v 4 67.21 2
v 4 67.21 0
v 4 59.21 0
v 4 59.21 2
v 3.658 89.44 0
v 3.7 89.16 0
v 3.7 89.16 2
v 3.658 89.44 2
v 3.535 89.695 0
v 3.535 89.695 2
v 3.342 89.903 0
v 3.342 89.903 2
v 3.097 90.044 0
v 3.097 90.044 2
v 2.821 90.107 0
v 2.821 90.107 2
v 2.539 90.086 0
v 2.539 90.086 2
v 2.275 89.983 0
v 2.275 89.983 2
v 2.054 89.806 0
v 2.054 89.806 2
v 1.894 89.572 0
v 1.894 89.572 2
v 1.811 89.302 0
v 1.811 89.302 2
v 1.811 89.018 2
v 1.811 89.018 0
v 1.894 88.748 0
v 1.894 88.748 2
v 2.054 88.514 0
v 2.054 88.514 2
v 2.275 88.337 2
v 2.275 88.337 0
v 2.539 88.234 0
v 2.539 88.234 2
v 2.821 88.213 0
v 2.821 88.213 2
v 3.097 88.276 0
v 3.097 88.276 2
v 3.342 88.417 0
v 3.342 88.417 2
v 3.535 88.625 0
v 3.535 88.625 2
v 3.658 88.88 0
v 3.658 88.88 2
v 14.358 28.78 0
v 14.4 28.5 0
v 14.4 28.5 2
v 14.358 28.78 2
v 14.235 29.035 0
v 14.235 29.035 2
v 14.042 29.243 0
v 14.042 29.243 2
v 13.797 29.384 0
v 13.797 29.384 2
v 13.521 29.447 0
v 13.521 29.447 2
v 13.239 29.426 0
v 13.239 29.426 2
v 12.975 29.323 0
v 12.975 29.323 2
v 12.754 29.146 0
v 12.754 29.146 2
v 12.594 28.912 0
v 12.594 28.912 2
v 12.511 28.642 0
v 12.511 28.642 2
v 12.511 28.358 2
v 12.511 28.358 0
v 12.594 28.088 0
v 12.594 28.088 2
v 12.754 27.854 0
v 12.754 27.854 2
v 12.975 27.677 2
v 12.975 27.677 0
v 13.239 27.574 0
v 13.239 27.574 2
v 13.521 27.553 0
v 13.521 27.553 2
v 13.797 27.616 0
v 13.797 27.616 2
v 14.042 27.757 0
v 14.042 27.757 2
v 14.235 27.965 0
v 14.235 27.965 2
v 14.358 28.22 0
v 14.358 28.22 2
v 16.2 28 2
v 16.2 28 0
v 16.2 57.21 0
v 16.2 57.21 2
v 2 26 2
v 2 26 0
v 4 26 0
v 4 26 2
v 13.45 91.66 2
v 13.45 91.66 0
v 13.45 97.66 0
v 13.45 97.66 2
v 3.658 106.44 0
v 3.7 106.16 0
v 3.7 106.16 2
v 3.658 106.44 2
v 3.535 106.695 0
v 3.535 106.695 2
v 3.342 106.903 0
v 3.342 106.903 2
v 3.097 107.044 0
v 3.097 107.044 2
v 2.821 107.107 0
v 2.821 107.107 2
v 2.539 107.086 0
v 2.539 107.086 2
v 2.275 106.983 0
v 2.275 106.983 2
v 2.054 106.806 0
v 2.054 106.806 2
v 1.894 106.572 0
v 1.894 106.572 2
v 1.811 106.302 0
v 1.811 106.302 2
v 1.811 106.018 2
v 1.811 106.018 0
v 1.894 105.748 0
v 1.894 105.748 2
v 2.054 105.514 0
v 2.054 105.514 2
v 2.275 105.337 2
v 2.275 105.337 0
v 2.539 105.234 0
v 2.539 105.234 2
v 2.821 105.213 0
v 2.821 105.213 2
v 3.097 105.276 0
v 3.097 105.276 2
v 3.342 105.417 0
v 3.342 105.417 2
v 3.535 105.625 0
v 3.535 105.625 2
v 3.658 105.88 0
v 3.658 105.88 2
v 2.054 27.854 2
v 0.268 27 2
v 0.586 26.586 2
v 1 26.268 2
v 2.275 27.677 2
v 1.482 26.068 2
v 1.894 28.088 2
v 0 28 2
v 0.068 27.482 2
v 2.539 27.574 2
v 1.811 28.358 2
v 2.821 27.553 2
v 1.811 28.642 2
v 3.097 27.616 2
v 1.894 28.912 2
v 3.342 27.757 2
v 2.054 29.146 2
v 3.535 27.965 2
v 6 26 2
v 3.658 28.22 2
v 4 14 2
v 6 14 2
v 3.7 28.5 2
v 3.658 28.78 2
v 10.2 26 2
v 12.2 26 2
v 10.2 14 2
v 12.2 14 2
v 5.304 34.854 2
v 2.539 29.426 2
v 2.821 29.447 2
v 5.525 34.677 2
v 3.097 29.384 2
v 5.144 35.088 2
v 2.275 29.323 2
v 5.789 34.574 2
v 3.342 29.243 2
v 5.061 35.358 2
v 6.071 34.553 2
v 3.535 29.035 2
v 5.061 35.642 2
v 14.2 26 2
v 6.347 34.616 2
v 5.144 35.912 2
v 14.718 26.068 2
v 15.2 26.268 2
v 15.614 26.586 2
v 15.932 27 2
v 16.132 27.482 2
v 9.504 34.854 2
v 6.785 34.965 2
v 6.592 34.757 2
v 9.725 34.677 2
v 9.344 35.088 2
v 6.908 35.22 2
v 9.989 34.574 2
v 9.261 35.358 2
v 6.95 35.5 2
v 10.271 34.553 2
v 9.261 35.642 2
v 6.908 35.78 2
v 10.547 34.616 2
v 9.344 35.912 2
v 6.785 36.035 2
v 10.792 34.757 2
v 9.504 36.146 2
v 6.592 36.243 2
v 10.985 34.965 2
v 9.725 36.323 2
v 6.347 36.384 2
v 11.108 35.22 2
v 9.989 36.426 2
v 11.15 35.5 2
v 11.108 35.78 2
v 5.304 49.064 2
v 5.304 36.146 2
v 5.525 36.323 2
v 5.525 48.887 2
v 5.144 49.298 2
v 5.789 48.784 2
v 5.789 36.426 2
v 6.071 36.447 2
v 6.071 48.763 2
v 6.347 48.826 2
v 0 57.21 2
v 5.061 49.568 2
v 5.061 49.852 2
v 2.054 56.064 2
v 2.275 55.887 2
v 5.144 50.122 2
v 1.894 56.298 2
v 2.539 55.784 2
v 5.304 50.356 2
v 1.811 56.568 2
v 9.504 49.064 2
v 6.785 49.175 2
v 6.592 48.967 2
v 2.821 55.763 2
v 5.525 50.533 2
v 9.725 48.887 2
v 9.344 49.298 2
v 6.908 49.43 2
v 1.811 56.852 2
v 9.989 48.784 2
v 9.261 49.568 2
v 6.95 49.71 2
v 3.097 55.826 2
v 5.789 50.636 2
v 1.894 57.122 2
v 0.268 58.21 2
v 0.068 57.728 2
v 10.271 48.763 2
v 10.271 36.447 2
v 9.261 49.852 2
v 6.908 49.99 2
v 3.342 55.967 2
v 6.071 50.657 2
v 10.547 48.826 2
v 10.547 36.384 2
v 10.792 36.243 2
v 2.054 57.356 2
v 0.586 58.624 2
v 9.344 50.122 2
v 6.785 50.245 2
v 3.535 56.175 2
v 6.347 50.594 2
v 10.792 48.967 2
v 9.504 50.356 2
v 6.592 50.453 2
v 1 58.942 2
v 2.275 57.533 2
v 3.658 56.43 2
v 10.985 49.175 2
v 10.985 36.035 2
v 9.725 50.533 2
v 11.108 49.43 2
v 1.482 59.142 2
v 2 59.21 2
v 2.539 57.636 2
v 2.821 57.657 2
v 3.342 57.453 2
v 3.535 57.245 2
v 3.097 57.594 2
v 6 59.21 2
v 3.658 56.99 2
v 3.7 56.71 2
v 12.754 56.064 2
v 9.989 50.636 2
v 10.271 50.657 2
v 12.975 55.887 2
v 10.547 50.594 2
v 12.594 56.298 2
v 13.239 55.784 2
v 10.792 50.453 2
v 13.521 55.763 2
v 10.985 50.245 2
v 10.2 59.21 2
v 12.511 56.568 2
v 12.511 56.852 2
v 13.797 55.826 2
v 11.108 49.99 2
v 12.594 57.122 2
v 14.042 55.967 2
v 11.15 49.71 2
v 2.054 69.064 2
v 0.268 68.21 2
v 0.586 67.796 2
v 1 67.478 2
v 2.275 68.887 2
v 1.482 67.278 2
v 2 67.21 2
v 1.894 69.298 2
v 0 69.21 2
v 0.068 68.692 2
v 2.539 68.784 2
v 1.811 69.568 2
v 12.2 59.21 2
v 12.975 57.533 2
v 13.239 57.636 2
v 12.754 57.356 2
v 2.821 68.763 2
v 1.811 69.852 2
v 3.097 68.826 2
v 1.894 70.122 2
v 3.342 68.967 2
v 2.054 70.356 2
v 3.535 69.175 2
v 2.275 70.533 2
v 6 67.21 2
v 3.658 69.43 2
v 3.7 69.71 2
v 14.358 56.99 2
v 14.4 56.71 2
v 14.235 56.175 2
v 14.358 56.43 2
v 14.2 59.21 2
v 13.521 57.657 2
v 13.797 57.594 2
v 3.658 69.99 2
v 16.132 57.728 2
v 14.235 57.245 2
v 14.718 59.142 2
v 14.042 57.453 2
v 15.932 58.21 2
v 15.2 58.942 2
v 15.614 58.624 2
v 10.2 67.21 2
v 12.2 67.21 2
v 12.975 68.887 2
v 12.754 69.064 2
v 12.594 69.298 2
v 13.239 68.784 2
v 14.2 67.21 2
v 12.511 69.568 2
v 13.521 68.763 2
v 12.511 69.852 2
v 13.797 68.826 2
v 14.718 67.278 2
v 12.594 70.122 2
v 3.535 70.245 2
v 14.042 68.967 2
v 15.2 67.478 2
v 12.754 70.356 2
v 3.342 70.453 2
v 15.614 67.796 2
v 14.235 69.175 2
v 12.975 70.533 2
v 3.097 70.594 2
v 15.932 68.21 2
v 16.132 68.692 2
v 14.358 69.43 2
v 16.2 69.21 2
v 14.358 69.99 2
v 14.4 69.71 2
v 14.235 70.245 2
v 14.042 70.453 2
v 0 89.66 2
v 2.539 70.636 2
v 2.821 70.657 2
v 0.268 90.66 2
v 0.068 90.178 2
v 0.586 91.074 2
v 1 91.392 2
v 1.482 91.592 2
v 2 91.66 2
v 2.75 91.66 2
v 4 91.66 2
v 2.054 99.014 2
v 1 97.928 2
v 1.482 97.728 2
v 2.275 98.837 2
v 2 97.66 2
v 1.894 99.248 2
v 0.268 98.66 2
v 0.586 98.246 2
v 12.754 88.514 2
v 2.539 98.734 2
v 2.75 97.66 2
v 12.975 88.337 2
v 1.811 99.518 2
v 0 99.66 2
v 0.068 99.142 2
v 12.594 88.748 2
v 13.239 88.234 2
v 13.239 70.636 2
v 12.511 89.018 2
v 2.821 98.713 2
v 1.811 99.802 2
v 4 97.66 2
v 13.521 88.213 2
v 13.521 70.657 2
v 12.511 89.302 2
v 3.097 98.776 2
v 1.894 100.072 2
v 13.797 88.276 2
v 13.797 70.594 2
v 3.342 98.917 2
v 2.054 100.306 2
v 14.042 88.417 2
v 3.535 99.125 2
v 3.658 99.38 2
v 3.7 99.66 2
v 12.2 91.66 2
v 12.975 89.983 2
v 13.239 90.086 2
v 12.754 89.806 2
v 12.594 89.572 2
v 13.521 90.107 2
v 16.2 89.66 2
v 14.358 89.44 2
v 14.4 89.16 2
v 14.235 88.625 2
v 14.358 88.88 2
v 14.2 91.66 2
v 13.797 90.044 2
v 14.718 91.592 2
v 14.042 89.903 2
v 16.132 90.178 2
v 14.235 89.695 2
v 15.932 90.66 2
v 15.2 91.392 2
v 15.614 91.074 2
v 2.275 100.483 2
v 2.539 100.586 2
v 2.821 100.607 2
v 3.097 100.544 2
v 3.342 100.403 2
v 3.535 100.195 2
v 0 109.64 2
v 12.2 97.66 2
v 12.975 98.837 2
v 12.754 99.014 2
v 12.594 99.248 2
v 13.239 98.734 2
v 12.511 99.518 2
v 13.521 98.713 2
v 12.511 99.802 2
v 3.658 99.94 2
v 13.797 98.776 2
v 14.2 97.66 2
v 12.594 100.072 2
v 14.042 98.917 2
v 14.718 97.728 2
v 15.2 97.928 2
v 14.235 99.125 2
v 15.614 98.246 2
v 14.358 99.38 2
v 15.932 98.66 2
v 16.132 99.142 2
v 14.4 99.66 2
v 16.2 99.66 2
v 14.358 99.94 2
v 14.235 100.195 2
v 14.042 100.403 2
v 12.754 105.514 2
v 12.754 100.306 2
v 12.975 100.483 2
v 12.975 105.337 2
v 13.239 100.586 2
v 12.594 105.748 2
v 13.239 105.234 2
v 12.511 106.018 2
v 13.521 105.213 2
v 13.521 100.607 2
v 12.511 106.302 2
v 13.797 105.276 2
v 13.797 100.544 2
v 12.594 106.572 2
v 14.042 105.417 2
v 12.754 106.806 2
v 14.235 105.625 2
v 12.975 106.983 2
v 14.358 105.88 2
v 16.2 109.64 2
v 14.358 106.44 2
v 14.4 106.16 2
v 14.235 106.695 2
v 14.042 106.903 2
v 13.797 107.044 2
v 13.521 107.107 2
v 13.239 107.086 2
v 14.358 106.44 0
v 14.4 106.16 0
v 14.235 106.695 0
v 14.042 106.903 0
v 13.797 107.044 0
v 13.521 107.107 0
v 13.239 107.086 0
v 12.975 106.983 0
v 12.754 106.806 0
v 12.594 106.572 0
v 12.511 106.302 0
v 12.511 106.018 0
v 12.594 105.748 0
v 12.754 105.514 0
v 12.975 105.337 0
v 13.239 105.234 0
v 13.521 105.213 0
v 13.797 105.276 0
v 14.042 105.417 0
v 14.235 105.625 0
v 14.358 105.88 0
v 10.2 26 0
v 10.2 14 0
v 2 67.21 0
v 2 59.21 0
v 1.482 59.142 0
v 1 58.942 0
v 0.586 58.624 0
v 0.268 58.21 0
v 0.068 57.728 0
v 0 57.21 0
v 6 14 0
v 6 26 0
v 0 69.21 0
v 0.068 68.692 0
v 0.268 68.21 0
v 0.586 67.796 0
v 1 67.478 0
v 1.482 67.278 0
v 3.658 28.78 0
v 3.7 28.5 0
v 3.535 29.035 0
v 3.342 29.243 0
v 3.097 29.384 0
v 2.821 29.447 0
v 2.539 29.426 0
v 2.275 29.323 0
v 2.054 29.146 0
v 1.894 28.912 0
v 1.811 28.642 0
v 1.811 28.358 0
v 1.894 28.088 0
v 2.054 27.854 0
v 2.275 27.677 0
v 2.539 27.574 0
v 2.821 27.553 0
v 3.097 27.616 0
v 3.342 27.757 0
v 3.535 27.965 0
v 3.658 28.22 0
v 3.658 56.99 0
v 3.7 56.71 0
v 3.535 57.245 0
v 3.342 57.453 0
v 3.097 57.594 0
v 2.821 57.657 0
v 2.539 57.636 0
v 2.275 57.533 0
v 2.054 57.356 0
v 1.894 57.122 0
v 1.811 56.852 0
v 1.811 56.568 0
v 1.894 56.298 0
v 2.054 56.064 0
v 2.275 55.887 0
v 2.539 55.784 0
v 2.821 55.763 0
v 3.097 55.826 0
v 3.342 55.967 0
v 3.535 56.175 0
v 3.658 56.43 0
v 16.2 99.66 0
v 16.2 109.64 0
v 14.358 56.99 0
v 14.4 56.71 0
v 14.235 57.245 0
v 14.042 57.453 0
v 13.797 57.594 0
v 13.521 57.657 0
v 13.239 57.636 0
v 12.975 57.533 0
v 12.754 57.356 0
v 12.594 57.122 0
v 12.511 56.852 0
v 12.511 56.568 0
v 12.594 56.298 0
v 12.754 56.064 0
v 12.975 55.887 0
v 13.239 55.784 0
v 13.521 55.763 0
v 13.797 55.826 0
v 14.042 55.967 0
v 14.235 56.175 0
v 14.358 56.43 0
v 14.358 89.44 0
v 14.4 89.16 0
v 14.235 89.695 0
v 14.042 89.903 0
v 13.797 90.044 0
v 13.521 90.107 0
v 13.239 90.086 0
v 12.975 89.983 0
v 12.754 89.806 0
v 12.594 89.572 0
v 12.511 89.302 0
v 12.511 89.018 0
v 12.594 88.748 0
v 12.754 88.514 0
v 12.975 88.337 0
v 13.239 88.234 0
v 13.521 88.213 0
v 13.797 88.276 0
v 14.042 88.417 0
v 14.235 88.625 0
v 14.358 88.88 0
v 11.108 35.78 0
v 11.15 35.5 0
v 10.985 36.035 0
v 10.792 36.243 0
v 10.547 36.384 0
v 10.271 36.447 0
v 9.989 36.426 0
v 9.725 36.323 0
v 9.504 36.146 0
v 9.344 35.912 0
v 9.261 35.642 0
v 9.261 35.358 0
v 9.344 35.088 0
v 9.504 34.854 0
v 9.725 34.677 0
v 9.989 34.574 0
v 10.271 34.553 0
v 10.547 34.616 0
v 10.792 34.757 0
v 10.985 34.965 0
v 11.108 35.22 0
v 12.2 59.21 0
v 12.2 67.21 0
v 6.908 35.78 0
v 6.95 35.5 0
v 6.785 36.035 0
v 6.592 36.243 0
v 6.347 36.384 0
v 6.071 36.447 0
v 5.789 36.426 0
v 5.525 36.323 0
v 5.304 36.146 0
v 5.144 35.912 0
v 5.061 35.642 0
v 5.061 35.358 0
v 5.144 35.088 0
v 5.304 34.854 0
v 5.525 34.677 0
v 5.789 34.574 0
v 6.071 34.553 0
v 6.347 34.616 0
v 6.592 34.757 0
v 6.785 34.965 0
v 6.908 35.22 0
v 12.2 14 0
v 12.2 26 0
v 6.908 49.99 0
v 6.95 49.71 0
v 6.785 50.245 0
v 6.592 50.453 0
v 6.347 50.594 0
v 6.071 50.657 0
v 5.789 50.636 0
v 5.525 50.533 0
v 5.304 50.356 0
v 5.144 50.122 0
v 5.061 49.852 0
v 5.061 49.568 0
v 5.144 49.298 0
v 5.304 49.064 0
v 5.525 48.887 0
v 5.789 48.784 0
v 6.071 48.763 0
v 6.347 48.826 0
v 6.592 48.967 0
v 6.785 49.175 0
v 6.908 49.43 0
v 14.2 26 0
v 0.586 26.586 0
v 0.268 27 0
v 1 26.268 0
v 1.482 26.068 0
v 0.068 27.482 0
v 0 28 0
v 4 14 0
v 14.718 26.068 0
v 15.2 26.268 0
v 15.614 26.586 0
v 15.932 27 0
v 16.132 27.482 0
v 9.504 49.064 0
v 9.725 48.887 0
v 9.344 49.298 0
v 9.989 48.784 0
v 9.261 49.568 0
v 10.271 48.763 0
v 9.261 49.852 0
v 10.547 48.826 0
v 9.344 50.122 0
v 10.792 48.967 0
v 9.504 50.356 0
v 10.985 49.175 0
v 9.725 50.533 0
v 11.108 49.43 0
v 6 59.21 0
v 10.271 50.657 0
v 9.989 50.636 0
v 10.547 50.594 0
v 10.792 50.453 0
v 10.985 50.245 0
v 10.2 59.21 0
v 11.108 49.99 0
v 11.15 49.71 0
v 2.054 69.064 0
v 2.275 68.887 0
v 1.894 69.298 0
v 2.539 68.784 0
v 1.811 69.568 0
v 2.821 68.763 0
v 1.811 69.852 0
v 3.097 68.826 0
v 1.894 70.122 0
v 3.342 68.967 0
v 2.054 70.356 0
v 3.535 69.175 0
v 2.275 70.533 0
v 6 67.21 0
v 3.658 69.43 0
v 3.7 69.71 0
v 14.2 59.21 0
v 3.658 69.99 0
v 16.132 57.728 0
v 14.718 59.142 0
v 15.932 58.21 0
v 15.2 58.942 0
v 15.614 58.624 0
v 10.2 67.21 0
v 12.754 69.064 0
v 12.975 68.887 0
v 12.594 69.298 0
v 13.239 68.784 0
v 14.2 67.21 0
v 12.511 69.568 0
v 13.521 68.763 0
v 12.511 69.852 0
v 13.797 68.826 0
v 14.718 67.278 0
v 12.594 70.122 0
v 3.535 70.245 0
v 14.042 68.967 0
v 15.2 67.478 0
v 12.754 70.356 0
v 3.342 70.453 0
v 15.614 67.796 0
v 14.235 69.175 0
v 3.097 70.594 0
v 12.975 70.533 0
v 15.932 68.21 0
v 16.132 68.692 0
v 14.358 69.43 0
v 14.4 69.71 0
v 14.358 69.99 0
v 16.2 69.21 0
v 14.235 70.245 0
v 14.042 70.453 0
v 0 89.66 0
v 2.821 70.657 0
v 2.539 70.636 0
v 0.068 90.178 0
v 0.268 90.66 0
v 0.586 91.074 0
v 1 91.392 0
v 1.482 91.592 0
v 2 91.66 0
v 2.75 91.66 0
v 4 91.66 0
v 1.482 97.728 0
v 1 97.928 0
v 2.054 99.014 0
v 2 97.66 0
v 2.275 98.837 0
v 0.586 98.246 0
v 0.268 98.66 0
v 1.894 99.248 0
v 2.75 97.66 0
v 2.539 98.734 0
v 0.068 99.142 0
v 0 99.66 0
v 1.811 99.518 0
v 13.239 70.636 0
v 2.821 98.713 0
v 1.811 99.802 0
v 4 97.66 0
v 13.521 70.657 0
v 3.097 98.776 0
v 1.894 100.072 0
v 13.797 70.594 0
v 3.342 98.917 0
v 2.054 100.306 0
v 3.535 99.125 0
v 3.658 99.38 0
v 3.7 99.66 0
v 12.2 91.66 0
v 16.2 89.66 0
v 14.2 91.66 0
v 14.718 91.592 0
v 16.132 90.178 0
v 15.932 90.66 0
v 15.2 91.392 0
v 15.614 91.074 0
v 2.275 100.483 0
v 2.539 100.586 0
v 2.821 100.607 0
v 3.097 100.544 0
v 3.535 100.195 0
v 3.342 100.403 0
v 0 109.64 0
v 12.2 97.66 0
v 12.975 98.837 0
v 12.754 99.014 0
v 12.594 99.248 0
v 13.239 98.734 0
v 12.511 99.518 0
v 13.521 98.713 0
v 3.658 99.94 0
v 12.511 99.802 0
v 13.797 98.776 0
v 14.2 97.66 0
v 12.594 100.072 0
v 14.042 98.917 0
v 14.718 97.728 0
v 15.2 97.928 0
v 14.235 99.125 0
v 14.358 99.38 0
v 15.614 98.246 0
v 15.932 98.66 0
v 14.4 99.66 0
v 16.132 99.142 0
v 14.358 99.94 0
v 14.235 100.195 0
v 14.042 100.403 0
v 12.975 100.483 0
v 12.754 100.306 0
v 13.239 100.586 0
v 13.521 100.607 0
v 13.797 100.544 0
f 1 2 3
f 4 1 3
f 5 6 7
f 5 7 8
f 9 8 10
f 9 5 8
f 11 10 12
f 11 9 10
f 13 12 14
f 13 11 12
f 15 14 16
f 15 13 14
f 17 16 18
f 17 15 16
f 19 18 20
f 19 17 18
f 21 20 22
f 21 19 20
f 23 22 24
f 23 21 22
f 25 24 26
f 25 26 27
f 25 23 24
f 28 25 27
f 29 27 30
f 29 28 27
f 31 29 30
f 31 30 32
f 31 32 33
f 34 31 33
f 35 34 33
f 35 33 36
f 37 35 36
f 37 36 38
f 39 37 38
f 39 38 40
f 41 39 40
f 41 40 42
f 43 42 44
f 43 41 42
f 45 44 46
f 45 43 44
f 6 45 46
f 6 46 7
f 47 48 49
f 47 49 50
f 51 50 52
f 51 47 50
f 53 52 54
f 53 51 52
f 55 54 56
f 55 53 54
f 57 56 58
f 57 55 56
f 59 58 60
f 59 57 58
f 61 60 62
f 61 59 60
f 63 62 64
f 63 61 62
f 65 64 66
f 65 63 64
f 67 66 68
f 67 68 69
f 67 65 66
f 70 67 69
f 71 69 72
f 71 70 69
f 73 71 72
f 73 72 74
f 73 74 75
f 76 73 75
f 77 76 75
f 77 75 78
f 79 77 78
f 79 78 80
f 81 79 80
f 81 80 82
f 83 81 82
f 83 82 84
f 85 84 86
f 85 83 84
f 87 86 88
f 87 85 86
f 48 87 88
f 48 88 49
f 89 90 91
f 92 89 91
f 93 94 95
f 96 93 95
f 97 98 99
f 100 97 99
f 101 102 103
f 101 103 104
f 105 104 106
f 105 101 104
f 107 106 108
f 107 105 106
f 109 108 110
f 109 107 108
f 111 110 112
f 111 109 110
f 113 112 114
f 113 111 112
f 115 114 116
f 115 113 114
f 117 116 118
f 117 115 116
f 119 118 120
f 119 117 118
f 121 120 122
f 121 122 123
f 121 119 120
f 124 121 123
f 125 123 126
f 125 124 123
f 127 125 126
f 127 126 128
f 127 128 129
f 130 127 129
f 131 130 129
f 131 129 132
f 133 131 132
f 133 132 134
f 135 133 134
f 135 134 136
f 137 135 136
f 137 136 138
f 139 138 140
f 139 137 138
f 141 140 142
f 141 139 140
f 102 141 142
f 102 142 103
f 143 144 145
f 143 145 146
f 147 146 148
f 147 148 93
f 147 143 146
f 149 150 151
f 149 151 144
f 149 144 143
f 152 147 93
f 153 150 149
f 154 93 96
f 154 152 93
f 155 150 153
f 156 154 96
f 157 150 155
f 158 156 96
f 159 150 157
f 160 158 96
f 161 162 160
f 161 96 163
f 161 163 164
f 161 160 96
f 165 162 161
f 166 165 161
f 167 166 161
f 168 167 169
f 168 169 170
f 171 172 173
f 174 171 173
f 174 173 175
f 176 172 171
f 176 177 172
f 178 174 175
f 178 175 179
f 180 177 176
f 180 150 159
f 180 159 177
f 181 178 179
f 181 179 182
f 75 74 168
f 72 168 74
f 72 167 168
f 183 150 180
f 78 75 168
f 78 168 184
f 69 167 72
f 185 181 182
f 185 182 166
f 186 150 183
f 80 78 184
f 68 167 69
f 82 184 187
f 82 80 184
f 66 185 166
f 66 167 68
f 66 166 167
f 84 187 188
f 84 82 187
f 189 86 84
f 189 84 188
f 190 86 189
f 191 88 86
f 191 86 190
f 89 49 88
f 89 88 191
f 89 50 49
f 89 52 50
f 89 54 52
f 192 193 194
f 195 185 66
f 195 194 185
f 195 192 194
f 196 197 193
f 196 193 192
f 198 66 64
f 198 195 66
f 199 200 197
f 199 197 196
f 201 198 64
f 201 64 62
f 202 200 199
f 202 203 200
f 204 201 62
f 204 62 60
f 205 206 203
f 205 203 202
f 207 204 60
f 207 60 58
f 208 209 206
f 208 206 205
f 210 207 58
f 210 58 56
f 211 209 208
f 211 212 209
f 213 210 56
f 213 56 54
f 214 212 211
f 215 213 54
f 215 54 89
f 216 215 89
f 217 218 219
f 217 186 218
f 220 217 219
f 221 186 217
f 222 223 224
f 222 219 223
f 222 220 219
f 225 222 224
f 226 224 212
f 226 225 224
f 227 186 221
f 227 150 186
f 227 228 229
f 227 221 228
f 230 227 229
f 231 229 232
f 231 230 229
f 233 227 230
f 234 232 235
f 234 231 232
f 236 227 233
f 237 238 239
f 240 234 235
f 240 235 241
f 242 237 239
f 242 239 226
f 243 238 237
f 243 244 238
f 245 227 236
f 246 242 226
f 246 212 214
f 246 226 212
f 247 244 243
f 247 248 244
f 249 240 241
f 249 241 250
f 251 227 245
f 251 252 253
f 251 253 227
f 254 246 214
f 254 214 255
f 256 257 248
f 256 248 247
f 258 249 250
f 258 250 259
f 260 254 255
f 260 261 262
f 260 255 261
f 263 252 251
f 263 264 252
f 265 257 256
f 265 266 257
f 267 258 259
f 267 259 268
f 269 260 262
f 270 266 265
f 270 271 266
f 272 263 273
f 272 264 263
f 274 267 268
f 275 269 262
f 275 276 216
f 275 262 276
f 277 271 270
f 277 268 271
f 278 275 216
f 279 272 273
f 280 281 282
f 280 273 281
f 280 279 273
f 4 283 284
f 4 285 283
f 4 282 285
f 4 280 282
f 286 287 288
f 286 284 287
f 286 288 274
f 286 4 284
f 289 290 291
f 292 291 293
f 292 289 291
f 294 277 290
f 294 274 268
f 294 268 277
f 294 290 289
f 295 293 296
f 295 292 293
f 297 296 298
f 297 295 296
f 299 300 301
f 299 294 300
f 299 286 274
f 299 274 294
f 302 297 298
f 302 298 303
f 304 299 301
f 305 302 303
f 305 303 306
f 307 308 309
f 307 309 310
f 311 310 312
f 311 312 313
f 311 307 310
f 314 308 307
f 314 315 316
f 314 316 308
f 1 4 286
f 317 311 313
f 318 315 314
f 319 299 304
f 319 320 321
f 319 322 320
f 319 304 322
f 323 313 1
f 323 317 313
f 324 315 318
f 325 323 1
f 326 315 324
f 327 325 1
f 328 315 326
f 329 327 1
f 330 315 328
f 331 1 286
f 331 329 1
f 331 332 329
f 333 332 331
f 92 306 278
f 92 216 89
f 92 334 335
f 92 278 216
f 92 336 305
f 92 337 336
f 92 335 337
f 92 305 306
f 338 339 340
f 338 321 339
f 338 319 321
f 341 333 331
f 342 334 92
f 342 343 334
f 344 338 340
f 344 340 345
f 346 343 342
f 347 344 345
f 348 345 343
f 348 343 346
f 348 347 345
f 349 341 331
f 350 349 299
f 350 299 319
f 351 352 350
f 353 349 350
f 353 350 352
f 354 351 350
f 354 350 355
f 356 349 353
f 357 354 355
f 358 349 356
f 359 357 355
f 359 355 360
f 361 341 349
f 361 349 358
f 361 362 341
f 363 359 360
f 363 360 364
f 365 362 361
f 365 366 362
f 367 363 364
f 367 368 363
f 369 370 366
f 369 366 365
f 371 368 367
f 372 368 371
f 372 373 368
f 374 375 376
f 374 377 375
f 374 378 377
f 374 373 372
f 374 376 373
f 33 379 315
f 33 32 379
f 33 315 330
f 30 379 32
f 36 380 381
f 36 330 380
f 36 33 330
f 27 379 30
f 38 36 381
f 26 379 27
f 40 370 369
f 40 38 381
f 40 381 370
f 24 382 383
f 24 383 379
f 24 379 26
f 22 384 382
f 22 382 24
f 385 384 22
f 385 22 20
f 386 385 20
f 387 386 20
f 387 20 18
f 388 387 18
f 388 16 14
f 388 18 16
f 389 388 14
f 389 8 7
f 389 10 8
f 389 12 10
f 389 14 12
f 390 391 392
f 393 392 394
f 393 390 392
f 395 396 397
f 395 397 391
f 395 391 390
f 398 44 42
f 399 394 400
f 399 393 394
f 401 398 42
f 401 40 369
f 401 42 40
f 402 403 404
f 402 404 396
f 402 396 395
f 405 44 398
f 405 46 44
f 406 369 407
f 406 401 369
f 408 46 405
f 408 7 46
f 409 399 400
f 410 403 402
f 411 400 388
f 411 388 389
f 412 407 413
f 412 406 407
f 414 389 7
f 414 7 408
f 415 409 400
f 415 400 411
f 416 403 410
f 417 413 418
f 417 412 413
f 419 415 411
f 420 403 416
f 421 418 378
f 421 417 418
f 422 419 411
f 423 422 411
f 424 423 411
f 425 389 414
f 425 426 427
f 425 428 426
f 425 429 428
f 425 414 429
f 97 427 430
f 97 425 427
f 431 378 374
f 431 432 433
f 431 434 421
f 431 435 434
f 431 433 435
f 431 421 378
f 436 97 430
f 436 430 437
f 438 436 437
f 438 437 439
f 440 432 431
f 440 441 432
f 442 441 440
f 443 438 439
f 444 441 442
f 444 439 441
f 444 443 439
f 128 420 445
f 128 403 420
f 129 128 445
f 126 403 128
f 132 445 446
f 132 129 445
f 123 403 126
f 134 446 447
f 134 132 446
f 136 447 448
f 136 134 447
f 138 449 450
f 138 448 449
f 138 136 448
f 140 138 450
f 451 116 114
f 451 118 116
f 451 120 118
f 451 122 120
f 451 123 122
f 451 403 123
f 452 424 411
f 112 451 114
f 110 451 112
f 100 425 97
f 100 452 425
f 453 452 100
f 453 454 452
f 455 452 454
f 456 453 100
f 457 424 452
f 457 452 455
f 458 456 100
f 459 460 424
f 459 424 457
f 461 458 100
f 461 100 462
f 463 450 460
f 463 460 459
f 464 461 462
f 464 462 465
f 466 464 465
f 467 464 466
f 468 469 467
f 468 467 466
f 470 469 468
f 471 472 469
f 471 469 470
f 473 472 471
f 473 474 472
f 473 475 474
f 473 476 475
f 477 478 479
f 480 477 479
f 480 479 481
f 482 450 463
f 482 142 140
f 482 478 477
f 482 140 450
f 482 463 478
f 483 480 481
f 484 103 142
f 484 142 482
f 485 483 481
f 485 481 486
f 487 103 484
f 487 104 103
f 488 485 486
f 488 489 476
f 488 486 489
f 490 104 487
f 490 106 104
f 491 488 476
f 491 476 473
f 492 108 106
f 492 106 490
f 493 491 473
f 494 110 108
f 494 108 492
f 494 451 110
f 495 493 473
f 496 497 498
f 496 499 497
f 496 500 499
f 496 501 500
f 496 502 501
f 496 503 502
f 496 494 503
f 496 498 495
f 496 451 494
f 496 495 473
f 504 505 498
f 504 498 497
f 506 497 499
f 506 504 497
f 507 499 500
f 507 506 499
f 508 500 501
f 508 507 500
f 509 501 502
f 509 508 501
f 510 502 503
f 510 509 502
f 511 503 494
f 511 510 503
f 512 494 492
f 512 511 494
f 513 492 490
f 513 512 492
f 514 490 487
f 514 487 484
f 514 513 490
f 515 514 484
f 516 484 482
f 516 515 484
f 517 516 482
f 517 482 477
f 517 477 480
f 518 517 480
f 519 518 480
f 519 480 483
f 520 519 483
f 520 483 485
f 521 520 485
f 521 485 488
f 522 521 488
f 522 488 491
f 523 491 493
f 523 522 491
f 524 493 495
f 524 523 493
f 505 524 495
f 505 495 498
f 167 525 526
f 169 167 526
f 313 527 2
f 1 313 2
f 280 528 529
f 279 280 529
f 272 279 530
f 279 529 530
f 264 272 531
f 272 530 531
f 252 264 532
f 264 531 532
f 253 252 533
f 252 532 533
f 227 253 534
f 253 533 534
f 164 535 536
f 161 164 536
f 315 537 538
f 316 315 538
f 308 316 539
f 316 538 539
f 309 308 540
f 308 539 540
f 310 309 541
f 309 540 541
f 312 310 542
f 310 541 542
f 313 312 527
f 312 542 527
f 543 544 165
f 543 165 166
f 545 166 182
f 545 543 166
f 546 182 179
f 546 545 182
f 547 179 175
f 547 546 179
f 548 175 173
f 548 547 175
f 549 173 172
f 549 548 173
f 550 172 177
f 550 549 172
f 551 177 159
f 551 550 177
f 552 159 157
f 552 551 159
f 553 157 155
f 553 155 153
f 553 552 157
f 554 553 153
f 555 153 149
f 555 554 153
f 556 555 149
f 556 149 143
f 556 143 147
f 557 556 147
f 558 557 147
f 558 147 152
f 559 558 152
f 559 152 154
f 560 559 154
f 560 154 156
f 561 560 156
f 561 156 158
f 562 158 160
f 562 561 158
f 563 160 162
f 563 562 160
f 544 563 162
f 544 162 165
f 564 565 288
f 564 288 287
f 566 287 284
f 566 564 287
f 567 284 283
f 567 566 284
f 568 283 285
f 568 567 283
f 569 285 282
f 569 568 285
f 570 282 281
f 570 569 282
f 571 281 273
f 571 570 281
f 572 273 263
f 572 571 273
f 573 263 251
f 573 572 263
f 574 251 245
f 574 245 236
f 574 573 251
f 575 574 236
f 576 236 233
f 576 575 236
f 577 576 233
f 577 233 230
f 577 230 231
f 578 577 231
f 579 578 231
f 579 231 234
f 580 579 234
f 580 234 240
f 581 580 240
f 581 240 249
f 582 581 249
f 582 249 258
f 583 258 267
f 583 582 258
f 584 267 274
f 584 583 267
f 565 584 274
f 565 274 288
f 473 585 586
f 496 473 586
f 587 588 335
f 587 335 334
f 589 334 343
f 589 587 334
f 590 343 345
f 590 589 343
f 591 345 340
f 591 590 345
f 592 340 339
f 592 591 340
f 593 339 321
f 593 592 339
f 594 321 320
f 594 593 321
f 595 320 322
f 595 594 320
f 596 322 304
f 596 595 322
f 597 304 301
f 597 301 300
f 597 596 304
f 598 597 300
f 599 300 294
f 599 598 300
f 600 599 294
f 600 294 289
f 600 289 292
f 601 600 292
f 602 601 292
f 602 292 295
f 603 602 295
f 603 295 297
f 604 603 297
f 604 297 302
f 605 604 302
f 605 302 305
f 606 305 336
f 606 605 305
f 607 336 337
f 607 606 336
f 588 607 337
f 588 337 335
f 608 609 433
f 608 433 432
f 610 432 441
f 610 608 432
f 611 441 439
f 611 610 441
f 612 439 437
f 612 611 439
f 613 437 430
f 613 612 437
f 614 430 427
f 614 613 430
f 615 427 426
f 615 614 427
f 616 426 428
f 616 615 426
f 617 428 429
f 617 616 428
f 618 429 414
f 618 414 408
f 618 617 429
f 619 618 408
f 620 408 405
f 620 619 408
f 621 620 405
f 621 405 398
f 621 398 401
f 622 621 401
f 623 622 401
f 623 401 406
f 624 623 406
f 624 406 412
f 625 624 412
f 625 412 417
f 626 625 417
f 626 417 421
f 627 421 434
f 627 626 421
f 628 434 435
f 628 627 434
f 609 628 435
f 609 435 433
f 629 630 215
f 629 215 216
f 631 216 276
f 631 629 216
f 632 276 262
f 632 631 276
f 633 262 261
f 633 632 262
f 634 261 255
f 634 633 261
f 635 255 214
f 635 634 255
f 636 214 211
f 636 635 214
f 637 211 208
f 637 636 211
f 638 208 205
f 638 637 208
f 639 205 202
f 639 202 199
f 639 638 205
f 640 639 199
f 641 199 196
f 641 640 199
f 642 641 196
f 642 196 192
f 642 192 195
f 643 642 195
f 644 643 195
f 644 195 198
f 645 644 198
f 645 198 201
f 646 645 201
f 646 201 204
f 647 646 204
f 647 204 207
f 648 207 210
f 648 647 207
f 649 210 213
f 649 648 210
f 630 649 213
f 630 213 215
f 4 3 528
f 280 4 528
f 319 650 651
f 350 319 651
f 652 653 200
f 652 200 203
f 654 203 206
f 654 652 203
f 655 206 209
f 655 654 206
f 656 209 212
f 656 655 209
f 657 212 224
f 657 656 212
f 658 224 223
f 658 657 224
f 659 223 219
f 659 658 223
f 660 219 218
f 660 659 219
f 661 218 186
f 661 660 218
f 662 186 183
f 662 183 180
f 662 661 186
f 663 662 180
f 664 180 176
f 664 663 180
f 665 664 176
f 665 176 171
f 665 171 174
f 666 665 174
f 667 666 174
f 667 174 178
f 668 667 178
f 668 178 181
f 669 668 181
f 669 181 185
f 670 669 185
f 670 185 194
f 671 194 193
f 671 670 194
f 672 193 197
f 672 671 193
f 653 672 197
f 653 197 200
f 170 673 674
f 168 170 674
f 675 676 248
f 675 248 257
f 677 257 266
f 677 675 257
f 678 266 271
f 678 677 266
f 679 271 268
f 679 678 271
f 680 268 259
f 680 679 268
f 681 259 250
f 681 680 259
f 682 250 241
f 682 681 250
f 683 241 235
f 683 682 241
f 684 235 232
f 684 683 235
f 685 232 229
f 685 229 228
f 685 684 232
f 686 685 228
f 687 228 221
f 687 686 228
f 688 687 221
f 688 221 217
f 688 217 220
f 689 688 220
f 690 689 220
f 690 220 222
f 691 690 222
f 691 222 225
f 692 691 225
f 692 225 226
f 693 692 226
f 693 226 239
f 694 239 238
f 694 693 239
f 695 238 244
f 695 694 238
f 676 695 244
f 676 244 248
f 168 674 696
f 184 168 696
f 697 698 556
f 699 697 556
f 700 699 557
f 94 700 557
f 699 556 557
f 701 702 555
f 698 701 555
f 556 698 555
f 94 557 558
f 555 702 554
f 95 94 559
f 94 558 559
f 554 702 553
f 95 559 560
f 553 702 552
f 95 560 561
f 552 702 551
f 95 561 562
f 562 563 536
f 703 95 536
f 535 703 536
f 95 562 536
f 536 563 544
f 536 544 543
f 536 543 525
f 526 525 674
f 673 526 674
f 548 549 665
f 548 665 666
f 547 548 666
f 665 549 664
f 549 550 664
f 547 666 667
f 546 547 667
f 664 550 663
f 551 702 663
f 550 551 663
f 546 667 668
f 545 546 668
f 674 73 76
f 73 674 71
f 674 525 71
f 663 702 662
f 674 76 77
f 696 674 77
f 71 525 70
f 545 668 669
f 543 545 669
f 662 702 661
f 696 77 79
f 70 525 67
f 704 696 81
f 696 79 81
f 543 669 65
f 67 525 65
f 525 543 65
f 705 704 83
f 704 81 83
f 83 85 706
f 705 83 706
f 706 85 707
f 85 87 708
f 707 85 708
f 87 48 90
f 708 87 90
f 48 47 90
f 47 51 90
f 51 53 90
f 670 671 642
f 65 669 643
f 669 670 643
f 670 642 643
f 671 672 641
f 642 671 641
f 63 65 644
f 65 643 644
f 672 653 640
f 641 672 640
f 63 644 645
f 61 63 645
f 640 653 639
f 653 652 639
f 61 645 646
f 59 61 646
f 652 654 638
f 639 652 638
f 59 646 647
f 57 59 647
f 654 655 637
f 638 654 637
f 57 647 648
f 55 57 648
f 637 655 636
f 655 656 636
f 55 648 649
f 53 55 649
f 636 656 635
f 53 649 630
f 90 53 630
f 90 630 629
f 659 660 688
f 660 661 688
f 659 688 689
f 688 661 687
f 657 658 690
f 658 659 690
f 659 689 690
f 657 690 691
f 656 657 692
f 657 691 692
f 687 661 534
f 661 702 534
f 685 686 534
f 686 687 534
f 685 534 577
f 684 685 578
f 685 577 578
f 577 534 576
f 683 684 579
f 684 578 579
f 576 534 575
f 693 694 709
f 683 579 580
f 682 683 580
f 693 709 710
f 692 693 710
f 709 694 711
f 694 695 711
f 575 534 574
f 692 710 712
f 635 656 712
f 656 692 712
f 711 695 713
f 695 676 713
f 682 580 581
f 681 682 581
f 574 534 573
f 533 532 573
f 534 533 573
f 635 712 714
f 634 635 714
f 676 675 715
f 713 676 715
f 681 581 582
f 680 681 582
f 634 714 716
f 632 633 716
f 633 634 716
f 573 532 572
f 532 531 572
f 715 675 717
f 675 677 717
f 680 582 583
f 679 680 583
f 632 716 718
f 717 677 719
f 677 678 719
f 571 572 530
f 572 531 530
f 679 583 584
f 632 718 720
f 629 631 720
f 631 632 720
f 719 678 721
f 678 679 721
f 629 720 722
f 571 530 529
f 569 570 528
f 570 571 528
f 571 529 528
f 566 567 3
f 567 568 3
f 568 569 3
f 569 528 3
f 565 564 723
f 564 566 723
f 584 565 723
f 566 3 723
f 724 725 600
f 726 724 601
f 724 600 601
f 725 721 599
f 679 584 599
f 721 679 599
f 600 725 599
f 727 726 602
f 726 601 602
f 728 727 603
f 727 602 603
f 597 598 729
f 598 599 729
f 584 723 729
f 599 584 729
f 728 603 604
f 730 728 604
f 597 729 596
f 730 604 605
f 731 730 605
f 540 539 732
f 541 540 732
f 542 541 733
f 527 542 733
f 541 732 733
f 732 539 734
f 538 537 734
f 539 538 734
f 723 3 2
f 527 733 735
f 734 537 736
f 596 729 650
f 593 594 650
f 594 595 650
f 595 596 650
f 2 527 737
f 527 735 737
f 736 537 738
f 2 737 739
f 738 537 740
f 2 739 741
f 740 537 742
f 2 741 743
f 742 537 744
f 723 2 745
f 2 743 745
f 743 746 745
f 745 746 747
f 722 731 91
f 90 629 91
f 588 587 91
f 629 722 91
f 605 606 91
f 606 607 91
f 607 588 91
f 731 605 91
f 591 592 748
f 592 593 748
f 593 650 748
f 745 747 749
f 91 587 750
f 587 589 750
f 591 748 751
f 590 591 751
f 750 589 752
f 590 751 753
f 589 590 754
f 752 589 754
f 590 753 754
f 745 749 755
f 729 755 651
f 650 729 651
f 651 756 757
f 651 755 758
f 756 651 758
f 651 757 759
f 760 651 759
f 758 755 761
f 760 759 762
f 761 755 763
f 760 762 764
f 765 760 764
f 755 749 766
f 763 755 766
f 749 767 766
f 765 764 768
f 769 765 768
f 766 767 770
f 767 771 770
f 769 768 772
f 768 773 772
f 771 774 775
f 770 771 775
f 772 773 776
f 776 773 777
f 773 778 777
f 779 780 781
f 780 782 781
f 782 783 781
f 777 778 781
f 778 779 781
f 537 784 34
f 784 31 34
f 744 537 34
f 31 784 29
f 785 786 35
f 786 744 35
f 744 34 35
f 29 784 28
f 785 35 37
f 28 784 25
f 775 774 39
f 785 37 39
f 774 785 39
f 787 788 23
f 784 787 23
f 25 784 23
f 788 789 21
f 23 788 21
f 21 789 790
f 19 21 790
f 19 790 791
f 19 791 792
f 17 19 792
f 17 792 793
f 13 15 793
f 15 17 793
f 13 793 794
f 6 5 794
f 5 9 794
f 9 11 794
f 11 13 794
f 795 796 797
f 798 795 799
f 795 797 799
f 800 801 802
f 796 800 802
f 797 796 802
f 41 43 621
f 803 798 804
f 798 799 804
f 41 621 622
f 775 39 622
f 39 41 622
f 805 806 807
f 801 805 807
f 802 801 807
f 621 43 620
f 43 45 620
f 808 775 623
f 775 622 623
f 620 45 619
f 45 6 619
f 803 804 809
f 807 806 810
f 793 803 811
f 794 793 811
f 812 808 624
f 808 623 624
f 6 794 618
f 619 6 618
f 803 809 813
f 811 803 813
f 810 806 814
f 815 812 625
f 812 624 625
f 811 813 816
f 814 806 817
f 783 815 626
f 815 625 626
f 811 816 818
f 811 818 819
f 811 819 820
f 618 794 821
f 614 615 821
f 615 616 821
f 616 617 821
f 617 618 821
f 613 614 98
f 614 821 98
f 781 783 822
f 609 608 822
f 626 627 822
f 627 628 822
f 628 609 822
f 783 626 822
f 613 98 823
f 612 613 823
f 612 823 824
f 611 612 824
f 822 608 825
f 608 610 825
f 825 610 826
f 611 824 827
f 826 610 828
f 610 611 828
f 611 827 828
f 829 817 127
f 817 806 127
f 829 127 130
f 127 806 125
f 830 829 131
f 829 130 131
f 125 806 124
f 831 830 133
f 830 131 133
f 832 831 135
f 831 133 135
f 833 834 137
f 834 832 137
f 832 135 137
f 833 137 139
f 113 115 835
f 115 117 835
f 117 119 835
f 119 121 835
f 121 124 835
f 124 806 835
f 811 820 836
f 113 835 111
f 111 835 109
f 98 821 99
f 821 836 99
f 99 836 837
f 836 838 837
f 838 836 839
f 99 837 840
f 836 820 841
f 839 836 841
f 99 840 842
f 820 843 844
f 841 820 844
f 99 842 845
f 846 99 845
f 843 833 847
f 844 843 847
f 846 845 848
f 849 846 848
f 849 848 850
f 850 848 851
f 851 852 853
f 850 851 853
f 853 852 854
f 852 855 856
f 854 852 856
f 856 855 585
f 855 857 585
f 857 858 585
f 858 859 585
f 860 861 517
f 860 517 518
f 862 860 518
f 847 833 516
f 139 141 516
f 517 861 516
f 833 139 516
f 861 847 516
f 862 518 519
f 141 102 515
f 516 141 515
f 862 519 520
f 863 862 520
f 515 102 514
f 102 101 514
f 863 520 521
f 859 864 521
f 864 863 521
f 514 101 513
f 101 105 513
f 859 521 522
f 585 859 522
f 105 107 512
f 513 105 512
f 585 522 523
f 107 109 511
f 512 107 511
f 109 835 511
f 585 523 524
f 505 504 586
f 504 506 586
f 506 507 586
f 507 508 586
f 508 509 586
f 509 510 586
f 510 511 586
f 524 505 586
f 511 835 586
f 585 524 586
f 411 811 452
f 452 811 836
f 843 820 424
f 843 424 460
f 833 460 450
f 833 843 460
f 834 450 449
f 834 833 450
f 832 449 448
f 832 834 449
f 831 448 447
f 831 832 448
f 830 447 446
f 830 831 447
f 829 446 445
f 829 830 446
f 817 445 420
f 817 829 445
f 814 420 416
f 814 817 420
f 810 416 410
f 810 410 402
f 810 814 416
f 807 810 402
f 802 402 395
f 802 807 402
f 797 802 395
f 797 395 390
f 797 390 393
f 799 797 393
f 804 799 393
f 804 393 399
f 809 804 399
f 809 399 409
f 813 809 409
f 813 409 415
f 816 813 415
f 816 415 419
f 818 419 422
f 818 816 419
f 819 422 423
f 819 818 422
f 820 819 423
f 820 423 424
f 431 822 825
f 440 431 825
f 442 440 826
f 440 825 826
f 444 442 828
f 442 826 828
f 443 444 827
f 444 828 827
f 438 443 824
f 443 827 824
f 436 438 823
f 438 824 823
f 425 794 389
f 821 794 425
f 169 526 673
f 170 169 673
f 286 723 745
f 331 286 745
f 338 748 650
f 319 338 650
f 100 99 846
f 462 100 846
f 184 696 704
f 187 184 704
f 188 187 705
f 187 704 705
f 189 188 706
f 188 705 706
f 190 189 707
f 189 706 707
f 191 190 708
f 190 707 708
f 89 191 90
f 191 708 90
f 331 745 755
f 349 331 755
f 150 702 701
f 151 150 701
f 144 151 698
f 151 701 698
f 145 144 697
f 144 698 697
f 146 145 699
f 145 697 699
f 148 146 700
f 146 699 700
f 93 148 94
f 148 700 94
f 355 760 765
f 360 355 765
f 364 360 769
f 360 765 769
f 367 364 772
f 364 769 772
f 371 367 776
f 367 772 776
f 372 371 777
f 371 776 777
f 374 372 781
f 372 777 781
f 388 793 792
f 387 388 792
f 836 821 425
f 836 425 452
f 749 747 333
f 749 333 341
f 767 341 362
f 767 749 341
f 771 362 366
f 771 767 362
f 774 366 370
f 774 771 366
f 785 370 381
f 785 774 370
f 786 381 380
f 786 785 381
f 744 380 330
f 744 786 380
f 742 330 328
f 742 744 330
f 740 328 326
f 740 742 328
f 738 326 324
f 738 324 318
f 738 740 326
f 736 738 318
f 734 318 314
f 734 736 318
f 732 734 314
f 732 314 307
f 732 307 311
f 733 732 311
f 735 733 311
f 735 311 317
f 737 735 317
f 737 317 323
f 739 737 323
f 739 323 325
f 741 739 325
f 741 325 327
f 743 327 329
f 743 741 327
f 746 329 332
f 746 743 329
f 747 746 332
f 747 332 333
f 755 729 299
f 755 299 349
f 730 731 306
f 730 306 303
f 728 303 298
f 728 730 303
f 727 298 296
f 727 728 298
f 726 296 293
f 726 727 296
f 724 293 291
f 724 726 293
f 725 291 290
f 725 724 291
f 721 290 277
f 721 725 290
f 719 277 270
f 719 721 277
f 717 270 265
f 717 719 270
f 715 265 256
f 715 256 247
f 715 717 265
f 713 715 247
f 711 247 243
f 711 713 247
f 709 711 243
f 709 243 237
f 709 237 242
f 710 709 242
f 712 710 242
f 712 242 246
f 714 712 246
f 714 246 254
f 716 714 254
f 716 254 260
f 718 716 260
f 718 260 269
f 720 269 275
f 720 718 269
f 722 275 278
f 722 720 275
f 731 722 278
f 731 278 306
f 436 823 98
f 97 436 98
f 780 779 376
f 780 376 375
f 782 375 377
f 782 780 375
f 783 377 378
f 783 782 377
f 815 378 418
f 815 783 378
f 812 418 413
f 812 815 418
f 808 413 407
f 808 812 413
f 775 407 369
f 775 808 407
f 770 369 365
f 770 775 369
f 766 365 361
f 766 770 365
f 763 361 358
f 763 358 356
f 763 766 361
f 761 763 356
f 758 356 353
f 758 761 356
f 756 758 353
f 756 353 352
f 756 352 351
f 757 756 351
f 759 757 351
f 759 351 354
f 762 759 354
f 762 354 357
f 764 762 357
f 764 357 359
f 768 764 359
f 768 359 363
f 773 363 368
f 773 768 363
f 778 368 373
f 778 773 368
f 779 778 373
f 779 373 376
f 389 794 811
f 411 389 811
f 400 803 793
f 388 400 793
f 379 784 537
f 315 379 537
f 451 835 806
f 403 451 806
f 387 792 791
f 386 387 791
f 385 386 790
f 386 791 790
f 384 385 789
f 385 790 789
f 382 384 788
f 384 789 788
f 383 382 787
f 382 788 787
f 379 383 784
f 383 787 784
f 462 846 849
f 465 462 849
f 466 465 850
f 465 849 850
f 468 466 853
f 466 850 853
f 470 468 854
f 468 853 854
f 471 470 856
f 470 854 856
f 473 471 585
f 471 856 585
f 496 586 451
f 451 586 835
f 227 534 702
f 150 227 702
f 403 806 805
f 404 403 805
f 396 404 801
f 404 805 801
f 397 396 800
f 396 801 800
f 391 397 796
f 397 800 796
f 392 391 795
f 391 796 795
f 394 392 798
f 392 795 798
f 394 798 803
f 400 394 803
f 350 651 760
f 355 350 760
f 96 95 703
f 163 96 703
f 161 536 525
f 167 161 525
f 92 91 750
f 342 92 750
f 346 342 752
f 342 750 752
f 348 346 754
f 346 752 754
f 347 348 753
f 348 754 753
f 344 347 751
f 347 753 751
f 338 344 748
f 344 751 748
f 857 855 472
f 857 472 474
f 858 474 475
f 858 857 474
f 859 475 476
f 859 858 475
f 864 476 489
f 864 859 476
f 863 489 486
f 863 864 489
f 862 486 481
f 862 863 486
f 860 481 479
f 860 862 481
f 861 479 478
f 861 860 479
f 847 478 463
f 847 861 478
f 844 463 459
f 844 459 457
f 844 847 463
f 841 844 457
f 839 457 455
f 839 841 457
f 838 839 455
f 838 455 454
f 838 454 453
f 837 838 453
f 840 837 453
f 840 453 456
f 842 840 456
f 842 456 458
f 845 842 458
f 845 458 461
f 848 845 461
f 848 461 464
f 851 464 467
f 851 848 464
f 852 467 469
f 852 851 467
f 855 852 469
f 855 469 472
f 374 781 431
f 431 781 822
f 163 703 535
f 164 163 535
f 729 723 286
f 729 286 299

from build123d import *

# Parameters (mm, degrees)
SKETCH1_R           = 0.95
SKETCH1_W           = 4.2
SKETCH1_H           = 8
SKETCH1_W_2         = 8.2
SKETCH1_H_2         = 6
BOSS_EXTRUDE1_DEPTH = 2


with BuildPart() as part:
    # Sketch1 → Boss-Extrude1 (new body)
    with BuildSketch(Plane.XY):
        with BuildLine():
            Line((16.2, 109.64), (0, 109.64))
            Line((0, 109.64), (0, 99.66))
            ThreePointArc((0, 99.66), (0.585786438, 98.245786438), (2, 97.66))
            Line((2, 97.66), (2.75, 97.66))
            Line((2.75, 97.66), (2.75, 91.66))
            Line((2.75, 91.66), (2, 91.66))
            ThreePointArc((2, 91.66), (0.585786438, 91.074213562), (0, 89.66))
            Line((0, 89.66), (0, 69.21))
            ThreePointArc((0, 69.21), (0.585786438, 67.795786438), (2, 67.21))
            Line((2, 67.21), (4, 67.21))
            Line((4, 67.21), (4, 59.21))
            Line((4, 59.21), (2, 59.21))
            ThreePointArc((2, 59.21), (0.585786438, 58.624213562), (0, 57.21))
            Line((0, 57.21), (0, 28))
            ThreePointArc((0, 28), (0.585786438, 26.585786438), (2, 26))
            Line((2, 26), (4, 26))
            Line((4, 26), (4, 14))
            Line((4, 14), (6, 14))
            Line((6, 14), (6, 26))
            Line((6, 26), (10.2, 26))
            Line((10.2, 26), (10.2, 14))
            Line((10.2, 14), (12.2, 14))
            Line((12.2, 14), (12.2, 26))
            Line((12.2, 26), (14.2, 26))
            ThreePointArc((14.2, 26), (15.614213562, 26.585786438), (16.2, 28))
            Line((16.2, 28), (16.2, 57.21))
            ThreePointArc((16.2, 57.21), (15.614213562, 58.624213562), (14.2, 59.21))
            Line((14.2, 59.21), (12.2, 59.21))
            Line((12.2, 59.21), (12.2, 67.21))
            Line((12.2, 67.21), (14.2, 67.21))
            ThreePointArc((14.2, 67.21), (15.614213562, 67.795786438), (16.2, 69.21))
            Line((16.2, 69.21), (16.2, 89.66))
            ThreePointArc((16.2, 89.66), (15.614213562, 91.074213562), (14.2, 91.66))
            Line((14.2, 91.66), (13.45, 91.66))
            Line((13.45, 91.66), (13.45, 97.66))
            Line((13.45, 97.66), (14.2, 97.66))
            ThreePointArc((14.2, 97.66), (15.614213562, 98.245786438), (16.2, 99.66))
            Line((16.2, 99.66), (16.2, 109.64))
        make_face()
        with Locations((13.45, 56.71)):
            Circle(SKETCH1_R, mode=Mode.SUBTRACT)
        with Locations((10.2, 49.71)):
            Circle(SKETCH1_R, mode=Mode.SUBTRACT)
        with Locations((13.45, 106.16)):
            Circle(SKETCH1_R, mode=Mode.SUBTRACT)
        with Locations((2.75, 99.66)):
            Circle(SKETCH1_R, mode=Mode.SUBTRACT)
        with Locations((6, 49.71)):
            Circle(SKETCH1_R, mode=Mode.SUBTRACT)
        with Locations((2.75, 28.5)):
            Circle(SKETCH1_R, mode=Mode.SUBTRACT)
        with Locations((2.75, 89.16)):
            Circle(SKETCH1_R, mode=Mode.SUBTRACT)
        with Locations((2.75, 56.71)):
            Circle(SKETCH1_R, mode=Mode.SUBTRACT)
        with Locations((13.45, 89.16)):
            Circle(SKETCH1_R, mode=Mode.SUBTRACT)
        with Locations((13.45, 99.66)):
            Circle(SKETCH1_R, mode=Mode.SUBTRACT)
        with Locations((13.45, 69.71)):
            Circle(SKETCH1_R, mode=Mode.SUBTRACT)
        with Locations((6, 35.5)):
            Circle(SKETCH1_R, mode=Mode.SUBTRACT)
        with Locations((2.75, 106.16)):
            Circle(SKETCH1_R, mode=Mode.SUBTRACT)
        with Locations((10.2, 35.5)):
            Circle(SKETCH1_R, mode=Mode.SUBTRACT)
        with Locations((2.75, 69.71)):
            Circle(SKETCH1_R, mode=Mode.SUBTRACT)
        with Locations((13.45, 28.5)):
            Circle(SKETCH1_R, mode=Mode.SUBTRACT)
        with Locations((8.1, 63.21)):
            Rectangle(SKETCH1_W, SKETCH1_H, mode=Mode.SUBTRACT)
        with Locations((8.1, 94.66)):
            Rectangle(SKETCH1_W_2, SKETCH1_H_2, mode=Mode.SUBTRACT)
    extrude(amount=BOSS_EXTRUDE1_DEPTH)


solid = part.part
